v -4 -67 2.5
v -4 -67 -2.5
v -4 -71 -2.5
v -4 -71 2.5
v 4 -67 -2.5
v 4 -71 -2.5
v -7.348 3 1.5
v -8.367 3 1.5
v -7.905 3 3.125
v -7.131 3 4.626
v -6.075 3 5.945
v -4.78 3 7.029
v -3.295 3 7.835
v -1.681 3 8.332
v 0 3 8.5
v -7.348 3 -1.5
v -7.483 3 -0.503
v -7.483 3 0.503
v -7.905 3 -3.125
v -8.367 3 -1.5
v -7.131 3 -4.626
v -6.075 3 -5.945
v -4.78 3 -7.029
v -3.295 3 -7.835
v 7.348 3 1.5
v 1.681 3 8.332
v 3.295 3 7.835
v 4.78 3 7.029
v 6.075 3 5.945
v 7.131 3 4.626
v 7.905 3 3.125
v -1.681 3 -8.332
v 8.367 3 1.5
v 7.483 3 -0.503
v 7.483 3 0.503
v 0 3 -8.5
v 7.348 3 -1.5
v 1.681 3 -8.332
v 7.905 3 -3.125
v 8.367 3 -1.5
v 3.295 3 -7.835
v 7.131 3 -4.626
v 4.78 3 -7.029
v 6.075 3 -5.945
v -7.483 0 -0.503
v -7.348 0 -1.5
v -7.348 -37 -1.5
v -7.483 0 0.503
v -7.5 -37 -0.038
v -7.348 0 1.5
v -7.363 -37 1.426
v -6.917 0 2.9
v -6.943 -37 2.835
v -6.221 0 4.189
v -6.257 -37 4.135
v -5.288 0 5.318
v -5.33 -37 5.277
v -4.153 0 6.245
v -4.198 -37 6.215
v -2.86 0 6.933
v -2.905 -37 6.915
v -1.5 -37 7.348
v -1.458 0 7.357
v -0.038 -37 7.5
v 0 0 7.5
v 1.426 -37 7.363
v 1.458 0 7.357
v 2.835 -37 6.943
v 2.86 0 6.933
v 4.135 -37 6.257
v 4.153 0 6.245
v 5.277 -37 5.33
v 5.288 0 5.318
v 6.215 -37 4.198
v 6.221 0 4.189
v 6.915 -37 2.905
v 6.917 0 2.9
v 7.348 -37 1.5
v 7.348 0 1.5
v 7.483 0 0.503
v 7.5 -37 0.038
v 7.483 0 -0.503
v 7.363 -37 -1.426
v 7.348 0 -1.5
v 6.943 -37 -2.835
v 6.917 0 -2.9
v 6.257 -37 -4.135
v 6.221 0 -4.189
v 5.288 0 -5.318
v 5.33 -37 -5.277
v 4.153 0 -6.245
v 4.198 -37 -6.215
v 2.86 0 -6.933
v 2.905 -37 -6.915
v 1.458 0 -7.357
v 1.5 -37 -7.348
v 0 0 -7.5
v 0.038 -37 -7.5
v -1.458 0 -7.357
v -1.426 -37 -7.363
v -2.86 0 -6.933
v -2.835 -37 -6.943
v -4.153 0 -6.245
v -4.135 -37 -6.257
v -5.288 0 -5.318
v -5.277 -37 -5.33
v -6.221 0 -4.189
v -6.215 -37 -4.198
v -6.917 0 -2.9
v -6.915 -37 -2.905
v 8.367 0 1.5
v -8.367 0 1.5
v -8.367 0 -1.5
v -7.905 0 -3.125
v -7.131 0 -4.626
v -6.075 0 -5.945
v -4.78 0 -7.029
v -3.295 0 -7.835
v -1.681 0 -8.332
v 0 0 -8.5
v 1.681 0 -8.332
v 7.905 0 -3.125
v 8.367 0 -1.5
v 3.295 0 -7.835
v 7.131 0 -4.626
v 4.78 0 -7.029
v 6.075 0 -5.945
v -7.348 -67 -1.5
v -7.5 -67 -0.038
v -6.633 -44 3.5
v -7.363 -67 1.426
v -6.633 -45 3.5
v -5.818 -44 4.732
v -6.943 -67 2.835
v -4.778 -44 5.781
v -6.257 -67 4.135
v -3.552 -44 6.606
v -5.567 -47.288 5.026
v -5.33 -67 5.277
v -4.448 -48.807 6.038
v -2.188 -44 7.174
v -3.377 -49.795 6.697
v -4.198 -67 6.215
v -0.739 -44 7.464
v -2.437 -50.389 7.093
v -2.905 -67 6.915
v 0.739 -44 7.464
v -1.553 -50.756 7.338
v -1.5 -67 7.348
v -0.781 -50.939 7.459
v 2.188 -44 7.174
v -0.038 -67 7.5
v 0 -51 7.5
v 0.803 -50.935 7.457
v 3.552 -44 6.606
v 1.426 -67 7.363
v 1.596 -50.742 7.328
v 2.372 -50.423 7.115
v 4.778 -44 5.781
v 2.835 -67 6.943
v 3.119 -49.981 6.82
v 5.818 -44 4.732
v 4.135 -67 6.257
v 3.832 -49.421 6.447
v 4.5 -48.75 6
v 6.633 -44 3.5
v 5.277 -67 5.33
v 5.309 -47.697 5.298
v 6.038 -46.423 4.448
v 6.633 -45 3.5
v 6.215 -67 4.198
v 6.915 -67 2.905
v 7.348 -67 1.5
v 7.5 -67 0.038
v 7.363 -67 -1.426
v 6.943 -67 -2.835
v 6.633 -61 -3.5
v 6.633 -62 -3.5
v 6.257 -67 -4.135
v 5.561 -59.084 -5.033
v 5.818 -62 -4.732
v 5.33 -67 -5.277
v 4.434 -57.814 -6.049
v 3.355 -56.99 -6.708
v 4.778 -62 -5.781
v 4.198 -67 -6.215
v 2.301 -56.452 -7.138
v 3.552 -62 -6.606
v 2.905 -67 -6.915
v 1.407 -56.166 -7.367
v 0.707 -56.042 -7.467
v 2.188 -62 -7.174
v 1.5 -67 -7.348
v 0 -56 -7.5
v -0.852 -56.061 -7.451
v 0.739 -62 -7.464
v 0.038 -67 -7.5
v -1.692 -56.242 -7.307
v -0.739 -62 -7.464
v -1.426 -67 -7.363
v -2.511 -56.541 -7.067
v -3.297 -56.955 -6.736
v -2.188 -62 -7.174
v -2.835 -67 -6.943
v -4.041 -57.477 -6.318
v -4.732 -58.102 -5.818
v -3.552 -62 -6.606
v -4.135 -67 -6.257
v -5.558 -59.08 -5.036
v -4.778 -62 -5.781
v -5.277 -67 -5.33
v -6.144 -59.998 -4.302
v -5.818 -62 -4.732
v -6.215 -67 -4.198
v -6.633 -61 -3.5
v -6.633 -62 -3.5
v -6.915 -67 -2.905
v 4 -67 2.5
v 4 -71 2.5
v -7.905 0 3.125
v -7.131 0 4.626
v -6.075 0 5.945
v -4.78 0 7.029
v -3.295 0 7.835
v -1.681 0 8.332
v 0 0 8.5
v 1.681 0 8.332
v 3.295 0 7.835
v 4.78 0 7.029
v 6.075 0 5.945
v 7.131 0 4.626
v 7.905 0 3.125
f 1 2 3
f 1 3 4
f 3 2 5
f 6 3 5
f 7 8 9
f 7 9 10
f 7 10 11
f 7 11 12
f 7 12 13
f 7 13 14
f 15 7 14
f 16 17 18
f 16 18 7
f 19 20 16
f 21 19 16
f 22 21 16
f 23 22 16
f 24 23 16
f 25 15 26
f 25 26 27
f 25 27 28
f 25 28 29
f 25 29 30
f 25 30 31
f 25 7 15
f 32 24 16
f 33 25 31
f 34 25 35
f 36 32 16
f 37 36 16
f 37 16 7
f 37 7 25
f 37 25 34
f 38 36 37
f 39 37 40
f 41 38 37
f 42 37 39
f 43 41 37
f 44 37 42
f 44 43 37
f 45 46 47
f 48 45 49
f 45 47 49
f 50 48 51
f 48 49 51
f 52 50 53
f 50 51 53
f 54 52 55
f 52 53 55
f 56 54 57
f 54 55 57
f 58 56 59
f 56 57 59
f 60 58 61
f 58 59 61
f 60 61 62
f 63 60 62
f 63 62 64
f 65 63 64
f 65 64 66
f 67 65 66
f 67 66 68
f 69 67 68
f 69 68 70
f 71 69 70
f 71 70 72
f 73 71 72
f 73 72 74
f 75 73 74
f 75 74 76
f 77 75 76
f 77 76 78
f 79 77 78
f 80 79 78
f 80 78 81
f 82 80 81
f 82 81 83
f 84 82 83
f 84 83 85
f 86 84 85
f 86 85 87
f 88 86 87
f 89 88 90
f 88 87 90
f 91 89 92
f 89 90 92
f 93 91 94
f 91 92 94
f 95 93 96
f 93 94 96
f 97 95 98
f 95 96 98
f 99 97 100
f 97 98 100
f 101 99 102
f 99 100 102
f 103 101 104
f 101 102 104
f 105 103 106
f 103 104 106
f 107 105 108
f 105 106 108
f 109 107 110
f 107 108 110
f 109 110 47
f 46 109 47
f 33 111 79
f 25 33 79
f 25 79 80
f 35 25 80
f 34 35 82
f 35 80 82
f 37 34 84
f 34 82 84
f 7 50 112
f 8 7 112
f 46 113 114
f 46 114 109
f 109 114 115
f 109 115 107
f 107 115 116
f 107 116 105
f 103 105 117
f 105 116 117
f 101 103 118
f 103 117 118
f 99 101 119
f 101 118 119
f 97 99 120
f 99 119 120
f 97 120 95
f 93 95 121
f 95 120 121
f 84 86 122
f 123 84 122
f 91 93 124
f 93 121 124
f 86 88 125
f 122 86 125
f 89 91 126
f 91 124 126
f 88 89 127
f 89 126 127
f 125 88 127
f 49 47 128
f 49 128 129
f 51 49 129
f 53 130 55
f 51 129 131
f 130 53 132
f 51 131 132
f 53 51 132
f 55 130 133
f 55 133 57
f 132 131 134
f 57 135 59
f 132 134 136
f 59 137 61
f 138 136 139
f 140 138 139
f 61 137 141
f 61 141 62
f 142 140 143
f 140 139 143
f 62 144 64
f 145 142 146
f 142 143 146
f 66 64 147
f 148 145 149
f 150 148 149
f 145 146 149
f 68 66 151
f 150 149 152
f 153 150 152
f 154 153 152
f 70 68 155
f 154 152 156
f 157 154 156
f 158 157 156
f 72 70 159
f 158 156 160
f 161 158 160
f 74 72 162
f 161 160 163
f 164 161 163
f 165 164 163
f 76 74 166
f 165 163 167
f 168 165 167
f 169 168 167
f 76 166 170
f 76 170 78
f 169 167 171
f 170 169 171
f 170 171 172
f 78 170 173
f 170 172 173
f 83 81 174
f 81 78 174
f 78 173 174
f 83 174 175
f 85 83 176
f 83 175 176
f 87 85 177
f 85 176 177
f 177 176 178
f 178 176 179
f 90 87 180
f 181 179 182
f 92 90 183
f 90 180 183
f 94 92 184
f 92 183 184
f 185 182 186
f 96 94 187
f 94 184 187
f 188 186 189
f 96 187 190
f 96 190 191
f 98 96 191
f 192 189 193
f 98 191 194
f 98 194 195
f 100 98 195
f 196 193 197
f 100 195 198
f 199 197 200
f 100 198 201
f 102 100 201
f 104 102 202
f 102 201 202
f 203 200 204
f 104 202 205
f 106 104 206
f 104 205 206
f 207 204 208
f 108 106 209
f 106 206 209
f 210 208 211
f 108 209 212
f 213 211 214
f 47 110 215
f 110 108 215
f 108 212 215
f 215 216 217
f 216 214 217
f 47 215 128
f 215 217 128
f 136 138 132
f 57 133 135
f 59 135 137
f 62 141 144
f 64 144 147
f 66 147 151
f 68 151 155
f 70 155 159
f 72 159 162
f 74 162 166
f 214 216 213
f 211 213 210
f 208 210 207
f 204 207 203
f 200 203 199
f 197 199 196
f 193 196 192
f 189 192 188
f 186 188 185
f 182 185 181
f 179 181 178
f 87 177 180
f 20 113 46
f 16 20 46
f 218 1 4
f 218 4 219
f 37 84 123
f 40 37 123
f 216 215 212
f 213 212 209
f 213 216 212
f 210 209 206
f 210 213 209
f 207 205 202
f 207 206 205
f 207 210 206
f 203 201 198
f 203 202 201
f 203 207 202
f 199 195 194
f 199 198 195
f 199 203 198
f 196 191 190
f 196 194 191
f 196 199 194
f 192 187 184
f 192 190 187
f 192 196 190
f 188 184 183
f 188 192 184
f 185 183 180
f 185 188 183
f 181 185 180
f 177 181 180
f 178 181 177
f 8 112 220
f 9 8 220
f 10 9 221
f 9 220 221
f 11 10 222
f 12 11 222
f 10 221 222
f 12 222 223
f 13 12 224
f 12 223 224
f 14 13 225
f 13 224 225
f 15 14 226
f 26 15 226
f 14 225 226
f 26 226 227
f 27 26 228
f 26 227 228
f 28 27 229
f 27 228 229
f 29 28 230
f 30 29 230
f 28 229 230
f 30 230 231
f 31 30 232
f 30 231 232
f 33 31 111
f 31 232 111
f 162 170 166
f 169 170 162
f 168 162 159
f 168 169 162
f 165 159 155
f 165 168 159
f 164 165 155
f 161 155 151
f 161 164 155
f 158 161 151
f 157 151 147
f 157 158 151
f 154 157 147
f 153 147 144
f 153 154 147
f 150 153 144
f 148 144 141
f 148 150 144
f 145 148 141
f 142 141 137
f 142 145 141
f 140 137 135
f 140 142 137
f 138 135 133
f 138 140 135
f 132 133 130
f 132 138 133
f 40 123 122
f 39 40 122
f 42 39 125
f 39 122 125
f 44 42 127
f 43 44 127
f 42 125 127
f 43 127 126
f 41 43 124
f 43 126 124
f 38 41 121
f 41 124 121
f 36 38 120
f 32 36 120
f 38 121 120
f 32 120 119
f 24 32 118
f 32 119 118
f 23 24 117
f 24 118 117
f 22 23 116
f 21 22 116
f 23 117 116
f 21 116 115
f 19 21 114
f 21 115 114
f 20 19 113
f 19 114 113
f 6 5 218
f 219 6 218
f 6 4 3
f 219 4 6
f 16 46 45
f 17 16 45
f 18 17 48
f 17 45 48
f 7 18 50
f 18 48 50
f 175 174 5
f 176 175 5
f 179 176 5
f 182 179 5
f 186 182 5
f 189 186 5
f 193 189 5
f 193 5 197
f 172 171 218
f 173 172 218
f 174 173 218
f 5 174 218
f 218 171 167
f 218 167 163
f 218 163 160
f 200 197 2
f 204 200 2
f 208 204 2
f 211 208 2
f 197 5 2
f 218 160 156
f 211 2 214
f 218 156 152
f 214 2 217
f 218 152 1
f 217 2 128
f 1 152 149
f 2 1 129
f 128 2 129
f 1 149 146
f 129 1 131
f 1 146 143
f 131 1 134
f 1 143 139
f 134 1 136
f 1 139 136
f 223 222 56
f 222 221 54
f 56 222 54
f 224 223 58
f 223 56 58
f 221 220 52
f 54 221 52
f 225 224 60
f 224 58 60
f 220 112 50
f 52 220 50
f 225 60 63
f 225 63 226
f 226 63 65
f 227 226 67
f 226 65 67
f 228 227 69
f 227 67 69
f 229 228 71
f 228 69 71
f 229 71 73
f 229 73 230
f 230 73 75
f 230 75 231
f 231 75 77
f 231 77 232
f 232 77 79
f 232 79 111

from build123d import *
from build123d.topology import SkipClean

# Parameters (mm, degrees)
BOSS_EXTRUDE1_DEPTH     = 3
BOSS_EXTRUDE2_START     = -67
SKETCH2_R               = 7.5
BOSS_EXTRUDE2_DEPTH     = 67
SKETCH4_W               = 8
SKETCH4_H               = 5
BOSS_EXTRUDE4_DEPTH     = 4
CUT_EXTRUDE1_DEPTH      = 72.994791478
CUT_EXTRUDE1_DEPTH_BACK = 72.994791478
SKETCH6_R               = 7.5
BOSS_EXTRUDE5_DEPTH     = 30


with BuildPart() as part:
    # Sketch1 → Boss-Extrude1 (new body)
    with BuildSketch(Plane(origin=(0, 0, 0), x_dir=(1, 0, 0), z_dir=(0, 1, 0))):
        with BuildLine():
            Line((-8.366600265, 1.5), (-7.348469228, 1.5))
            ThreePointArc((-7.348469228, 1.5), (-7.5, 0), (-7.348469228, -1.5))
            Line((-7.348469228, -1.5), (-8.366600265, -1.5))
            ThreePointArc((-8.366600265, -1.5), (0, -8.5), (8.366600265, -1.5))
            Line((8.366600265, -1.5), (7.348469228, -1.5))
            ThreePointArc((7.348469228, -1.5), (7.5, 0), (7.348469228, 1.5))
            Line((7.348469228, 1.5), (8.366600265, 1.5))
            ThreePointArc((8.366600265, 1.5), (0, 8.5), (-8.366600265, 1.5))
        make_face()
    extrude(amount=BOSS_EXTRUDE1_DEPTH)

    # Sketch2 → Boss-Extrude2 (add)
    with BuildSketch(Plane(origin=(0, 0, 0), x_dir=(1, 0, 0), z_dir=(0, 1, 0)).offset(BOSS_EXTRUDE2_START)):
        with Locations(Location((0, 0, 0), (0, 0, 168.463040967))):
            Circle(SKETCH2_R)
    extrude(amount=BOSS_EXTRUDE2_DEPTH)

    # Sketch4 → Boss-Extrude4 (add)
    with BuildSketch(Plane.XZ.offset(67)):
        Rectangle(SKETCH4_W, SKETCH4_H)
    extrude(amount=BOSS_EXTRUDE4_DEPTH)

    # Sketch5 → Cut-Extrude1 (cut, two sides: drawn at the far end of the back side and taken through both)
    with BuildSketch(Plane(origin=(0, 0, 0), x_dir=(0, 0, -1), z_dir=(1, 0, 0)).offset(-CUT_EXTRUDE1_DEPTH_BACK)):
        Polygon((-7.5, -51), (-3.5, -45), (-3.5, -44), (-7.5, -44), align=None)
        Polygon((7.5, -62), (3.5, -62), (3.5, -61), (7.5, -56), align=None)
    extrude(amount=CUT_EXTRUDE1_DEPTH + CUT_EXTRUDE1_DEPTH_BACK, mode=Mode.SUBTRACT)

    # Sketch6 → Boss-Extrude5 (add)
    with SkipClean():  # the faces are left unmerged after this step: merging them gives an invalid solid
        with BuildSketch(Plane(origin=(0, -67, 0), x_dir=(-1, 0, 0), z_dir=(0, -1, 0))):
            with Locations(Location((0, 0, 0), (0, 0, 11.536959033))):
                Circle(SKETCH6_R)
        extrude(amount=-BOSS_EXTRUDE5_DEPTH)


solid = part.part
